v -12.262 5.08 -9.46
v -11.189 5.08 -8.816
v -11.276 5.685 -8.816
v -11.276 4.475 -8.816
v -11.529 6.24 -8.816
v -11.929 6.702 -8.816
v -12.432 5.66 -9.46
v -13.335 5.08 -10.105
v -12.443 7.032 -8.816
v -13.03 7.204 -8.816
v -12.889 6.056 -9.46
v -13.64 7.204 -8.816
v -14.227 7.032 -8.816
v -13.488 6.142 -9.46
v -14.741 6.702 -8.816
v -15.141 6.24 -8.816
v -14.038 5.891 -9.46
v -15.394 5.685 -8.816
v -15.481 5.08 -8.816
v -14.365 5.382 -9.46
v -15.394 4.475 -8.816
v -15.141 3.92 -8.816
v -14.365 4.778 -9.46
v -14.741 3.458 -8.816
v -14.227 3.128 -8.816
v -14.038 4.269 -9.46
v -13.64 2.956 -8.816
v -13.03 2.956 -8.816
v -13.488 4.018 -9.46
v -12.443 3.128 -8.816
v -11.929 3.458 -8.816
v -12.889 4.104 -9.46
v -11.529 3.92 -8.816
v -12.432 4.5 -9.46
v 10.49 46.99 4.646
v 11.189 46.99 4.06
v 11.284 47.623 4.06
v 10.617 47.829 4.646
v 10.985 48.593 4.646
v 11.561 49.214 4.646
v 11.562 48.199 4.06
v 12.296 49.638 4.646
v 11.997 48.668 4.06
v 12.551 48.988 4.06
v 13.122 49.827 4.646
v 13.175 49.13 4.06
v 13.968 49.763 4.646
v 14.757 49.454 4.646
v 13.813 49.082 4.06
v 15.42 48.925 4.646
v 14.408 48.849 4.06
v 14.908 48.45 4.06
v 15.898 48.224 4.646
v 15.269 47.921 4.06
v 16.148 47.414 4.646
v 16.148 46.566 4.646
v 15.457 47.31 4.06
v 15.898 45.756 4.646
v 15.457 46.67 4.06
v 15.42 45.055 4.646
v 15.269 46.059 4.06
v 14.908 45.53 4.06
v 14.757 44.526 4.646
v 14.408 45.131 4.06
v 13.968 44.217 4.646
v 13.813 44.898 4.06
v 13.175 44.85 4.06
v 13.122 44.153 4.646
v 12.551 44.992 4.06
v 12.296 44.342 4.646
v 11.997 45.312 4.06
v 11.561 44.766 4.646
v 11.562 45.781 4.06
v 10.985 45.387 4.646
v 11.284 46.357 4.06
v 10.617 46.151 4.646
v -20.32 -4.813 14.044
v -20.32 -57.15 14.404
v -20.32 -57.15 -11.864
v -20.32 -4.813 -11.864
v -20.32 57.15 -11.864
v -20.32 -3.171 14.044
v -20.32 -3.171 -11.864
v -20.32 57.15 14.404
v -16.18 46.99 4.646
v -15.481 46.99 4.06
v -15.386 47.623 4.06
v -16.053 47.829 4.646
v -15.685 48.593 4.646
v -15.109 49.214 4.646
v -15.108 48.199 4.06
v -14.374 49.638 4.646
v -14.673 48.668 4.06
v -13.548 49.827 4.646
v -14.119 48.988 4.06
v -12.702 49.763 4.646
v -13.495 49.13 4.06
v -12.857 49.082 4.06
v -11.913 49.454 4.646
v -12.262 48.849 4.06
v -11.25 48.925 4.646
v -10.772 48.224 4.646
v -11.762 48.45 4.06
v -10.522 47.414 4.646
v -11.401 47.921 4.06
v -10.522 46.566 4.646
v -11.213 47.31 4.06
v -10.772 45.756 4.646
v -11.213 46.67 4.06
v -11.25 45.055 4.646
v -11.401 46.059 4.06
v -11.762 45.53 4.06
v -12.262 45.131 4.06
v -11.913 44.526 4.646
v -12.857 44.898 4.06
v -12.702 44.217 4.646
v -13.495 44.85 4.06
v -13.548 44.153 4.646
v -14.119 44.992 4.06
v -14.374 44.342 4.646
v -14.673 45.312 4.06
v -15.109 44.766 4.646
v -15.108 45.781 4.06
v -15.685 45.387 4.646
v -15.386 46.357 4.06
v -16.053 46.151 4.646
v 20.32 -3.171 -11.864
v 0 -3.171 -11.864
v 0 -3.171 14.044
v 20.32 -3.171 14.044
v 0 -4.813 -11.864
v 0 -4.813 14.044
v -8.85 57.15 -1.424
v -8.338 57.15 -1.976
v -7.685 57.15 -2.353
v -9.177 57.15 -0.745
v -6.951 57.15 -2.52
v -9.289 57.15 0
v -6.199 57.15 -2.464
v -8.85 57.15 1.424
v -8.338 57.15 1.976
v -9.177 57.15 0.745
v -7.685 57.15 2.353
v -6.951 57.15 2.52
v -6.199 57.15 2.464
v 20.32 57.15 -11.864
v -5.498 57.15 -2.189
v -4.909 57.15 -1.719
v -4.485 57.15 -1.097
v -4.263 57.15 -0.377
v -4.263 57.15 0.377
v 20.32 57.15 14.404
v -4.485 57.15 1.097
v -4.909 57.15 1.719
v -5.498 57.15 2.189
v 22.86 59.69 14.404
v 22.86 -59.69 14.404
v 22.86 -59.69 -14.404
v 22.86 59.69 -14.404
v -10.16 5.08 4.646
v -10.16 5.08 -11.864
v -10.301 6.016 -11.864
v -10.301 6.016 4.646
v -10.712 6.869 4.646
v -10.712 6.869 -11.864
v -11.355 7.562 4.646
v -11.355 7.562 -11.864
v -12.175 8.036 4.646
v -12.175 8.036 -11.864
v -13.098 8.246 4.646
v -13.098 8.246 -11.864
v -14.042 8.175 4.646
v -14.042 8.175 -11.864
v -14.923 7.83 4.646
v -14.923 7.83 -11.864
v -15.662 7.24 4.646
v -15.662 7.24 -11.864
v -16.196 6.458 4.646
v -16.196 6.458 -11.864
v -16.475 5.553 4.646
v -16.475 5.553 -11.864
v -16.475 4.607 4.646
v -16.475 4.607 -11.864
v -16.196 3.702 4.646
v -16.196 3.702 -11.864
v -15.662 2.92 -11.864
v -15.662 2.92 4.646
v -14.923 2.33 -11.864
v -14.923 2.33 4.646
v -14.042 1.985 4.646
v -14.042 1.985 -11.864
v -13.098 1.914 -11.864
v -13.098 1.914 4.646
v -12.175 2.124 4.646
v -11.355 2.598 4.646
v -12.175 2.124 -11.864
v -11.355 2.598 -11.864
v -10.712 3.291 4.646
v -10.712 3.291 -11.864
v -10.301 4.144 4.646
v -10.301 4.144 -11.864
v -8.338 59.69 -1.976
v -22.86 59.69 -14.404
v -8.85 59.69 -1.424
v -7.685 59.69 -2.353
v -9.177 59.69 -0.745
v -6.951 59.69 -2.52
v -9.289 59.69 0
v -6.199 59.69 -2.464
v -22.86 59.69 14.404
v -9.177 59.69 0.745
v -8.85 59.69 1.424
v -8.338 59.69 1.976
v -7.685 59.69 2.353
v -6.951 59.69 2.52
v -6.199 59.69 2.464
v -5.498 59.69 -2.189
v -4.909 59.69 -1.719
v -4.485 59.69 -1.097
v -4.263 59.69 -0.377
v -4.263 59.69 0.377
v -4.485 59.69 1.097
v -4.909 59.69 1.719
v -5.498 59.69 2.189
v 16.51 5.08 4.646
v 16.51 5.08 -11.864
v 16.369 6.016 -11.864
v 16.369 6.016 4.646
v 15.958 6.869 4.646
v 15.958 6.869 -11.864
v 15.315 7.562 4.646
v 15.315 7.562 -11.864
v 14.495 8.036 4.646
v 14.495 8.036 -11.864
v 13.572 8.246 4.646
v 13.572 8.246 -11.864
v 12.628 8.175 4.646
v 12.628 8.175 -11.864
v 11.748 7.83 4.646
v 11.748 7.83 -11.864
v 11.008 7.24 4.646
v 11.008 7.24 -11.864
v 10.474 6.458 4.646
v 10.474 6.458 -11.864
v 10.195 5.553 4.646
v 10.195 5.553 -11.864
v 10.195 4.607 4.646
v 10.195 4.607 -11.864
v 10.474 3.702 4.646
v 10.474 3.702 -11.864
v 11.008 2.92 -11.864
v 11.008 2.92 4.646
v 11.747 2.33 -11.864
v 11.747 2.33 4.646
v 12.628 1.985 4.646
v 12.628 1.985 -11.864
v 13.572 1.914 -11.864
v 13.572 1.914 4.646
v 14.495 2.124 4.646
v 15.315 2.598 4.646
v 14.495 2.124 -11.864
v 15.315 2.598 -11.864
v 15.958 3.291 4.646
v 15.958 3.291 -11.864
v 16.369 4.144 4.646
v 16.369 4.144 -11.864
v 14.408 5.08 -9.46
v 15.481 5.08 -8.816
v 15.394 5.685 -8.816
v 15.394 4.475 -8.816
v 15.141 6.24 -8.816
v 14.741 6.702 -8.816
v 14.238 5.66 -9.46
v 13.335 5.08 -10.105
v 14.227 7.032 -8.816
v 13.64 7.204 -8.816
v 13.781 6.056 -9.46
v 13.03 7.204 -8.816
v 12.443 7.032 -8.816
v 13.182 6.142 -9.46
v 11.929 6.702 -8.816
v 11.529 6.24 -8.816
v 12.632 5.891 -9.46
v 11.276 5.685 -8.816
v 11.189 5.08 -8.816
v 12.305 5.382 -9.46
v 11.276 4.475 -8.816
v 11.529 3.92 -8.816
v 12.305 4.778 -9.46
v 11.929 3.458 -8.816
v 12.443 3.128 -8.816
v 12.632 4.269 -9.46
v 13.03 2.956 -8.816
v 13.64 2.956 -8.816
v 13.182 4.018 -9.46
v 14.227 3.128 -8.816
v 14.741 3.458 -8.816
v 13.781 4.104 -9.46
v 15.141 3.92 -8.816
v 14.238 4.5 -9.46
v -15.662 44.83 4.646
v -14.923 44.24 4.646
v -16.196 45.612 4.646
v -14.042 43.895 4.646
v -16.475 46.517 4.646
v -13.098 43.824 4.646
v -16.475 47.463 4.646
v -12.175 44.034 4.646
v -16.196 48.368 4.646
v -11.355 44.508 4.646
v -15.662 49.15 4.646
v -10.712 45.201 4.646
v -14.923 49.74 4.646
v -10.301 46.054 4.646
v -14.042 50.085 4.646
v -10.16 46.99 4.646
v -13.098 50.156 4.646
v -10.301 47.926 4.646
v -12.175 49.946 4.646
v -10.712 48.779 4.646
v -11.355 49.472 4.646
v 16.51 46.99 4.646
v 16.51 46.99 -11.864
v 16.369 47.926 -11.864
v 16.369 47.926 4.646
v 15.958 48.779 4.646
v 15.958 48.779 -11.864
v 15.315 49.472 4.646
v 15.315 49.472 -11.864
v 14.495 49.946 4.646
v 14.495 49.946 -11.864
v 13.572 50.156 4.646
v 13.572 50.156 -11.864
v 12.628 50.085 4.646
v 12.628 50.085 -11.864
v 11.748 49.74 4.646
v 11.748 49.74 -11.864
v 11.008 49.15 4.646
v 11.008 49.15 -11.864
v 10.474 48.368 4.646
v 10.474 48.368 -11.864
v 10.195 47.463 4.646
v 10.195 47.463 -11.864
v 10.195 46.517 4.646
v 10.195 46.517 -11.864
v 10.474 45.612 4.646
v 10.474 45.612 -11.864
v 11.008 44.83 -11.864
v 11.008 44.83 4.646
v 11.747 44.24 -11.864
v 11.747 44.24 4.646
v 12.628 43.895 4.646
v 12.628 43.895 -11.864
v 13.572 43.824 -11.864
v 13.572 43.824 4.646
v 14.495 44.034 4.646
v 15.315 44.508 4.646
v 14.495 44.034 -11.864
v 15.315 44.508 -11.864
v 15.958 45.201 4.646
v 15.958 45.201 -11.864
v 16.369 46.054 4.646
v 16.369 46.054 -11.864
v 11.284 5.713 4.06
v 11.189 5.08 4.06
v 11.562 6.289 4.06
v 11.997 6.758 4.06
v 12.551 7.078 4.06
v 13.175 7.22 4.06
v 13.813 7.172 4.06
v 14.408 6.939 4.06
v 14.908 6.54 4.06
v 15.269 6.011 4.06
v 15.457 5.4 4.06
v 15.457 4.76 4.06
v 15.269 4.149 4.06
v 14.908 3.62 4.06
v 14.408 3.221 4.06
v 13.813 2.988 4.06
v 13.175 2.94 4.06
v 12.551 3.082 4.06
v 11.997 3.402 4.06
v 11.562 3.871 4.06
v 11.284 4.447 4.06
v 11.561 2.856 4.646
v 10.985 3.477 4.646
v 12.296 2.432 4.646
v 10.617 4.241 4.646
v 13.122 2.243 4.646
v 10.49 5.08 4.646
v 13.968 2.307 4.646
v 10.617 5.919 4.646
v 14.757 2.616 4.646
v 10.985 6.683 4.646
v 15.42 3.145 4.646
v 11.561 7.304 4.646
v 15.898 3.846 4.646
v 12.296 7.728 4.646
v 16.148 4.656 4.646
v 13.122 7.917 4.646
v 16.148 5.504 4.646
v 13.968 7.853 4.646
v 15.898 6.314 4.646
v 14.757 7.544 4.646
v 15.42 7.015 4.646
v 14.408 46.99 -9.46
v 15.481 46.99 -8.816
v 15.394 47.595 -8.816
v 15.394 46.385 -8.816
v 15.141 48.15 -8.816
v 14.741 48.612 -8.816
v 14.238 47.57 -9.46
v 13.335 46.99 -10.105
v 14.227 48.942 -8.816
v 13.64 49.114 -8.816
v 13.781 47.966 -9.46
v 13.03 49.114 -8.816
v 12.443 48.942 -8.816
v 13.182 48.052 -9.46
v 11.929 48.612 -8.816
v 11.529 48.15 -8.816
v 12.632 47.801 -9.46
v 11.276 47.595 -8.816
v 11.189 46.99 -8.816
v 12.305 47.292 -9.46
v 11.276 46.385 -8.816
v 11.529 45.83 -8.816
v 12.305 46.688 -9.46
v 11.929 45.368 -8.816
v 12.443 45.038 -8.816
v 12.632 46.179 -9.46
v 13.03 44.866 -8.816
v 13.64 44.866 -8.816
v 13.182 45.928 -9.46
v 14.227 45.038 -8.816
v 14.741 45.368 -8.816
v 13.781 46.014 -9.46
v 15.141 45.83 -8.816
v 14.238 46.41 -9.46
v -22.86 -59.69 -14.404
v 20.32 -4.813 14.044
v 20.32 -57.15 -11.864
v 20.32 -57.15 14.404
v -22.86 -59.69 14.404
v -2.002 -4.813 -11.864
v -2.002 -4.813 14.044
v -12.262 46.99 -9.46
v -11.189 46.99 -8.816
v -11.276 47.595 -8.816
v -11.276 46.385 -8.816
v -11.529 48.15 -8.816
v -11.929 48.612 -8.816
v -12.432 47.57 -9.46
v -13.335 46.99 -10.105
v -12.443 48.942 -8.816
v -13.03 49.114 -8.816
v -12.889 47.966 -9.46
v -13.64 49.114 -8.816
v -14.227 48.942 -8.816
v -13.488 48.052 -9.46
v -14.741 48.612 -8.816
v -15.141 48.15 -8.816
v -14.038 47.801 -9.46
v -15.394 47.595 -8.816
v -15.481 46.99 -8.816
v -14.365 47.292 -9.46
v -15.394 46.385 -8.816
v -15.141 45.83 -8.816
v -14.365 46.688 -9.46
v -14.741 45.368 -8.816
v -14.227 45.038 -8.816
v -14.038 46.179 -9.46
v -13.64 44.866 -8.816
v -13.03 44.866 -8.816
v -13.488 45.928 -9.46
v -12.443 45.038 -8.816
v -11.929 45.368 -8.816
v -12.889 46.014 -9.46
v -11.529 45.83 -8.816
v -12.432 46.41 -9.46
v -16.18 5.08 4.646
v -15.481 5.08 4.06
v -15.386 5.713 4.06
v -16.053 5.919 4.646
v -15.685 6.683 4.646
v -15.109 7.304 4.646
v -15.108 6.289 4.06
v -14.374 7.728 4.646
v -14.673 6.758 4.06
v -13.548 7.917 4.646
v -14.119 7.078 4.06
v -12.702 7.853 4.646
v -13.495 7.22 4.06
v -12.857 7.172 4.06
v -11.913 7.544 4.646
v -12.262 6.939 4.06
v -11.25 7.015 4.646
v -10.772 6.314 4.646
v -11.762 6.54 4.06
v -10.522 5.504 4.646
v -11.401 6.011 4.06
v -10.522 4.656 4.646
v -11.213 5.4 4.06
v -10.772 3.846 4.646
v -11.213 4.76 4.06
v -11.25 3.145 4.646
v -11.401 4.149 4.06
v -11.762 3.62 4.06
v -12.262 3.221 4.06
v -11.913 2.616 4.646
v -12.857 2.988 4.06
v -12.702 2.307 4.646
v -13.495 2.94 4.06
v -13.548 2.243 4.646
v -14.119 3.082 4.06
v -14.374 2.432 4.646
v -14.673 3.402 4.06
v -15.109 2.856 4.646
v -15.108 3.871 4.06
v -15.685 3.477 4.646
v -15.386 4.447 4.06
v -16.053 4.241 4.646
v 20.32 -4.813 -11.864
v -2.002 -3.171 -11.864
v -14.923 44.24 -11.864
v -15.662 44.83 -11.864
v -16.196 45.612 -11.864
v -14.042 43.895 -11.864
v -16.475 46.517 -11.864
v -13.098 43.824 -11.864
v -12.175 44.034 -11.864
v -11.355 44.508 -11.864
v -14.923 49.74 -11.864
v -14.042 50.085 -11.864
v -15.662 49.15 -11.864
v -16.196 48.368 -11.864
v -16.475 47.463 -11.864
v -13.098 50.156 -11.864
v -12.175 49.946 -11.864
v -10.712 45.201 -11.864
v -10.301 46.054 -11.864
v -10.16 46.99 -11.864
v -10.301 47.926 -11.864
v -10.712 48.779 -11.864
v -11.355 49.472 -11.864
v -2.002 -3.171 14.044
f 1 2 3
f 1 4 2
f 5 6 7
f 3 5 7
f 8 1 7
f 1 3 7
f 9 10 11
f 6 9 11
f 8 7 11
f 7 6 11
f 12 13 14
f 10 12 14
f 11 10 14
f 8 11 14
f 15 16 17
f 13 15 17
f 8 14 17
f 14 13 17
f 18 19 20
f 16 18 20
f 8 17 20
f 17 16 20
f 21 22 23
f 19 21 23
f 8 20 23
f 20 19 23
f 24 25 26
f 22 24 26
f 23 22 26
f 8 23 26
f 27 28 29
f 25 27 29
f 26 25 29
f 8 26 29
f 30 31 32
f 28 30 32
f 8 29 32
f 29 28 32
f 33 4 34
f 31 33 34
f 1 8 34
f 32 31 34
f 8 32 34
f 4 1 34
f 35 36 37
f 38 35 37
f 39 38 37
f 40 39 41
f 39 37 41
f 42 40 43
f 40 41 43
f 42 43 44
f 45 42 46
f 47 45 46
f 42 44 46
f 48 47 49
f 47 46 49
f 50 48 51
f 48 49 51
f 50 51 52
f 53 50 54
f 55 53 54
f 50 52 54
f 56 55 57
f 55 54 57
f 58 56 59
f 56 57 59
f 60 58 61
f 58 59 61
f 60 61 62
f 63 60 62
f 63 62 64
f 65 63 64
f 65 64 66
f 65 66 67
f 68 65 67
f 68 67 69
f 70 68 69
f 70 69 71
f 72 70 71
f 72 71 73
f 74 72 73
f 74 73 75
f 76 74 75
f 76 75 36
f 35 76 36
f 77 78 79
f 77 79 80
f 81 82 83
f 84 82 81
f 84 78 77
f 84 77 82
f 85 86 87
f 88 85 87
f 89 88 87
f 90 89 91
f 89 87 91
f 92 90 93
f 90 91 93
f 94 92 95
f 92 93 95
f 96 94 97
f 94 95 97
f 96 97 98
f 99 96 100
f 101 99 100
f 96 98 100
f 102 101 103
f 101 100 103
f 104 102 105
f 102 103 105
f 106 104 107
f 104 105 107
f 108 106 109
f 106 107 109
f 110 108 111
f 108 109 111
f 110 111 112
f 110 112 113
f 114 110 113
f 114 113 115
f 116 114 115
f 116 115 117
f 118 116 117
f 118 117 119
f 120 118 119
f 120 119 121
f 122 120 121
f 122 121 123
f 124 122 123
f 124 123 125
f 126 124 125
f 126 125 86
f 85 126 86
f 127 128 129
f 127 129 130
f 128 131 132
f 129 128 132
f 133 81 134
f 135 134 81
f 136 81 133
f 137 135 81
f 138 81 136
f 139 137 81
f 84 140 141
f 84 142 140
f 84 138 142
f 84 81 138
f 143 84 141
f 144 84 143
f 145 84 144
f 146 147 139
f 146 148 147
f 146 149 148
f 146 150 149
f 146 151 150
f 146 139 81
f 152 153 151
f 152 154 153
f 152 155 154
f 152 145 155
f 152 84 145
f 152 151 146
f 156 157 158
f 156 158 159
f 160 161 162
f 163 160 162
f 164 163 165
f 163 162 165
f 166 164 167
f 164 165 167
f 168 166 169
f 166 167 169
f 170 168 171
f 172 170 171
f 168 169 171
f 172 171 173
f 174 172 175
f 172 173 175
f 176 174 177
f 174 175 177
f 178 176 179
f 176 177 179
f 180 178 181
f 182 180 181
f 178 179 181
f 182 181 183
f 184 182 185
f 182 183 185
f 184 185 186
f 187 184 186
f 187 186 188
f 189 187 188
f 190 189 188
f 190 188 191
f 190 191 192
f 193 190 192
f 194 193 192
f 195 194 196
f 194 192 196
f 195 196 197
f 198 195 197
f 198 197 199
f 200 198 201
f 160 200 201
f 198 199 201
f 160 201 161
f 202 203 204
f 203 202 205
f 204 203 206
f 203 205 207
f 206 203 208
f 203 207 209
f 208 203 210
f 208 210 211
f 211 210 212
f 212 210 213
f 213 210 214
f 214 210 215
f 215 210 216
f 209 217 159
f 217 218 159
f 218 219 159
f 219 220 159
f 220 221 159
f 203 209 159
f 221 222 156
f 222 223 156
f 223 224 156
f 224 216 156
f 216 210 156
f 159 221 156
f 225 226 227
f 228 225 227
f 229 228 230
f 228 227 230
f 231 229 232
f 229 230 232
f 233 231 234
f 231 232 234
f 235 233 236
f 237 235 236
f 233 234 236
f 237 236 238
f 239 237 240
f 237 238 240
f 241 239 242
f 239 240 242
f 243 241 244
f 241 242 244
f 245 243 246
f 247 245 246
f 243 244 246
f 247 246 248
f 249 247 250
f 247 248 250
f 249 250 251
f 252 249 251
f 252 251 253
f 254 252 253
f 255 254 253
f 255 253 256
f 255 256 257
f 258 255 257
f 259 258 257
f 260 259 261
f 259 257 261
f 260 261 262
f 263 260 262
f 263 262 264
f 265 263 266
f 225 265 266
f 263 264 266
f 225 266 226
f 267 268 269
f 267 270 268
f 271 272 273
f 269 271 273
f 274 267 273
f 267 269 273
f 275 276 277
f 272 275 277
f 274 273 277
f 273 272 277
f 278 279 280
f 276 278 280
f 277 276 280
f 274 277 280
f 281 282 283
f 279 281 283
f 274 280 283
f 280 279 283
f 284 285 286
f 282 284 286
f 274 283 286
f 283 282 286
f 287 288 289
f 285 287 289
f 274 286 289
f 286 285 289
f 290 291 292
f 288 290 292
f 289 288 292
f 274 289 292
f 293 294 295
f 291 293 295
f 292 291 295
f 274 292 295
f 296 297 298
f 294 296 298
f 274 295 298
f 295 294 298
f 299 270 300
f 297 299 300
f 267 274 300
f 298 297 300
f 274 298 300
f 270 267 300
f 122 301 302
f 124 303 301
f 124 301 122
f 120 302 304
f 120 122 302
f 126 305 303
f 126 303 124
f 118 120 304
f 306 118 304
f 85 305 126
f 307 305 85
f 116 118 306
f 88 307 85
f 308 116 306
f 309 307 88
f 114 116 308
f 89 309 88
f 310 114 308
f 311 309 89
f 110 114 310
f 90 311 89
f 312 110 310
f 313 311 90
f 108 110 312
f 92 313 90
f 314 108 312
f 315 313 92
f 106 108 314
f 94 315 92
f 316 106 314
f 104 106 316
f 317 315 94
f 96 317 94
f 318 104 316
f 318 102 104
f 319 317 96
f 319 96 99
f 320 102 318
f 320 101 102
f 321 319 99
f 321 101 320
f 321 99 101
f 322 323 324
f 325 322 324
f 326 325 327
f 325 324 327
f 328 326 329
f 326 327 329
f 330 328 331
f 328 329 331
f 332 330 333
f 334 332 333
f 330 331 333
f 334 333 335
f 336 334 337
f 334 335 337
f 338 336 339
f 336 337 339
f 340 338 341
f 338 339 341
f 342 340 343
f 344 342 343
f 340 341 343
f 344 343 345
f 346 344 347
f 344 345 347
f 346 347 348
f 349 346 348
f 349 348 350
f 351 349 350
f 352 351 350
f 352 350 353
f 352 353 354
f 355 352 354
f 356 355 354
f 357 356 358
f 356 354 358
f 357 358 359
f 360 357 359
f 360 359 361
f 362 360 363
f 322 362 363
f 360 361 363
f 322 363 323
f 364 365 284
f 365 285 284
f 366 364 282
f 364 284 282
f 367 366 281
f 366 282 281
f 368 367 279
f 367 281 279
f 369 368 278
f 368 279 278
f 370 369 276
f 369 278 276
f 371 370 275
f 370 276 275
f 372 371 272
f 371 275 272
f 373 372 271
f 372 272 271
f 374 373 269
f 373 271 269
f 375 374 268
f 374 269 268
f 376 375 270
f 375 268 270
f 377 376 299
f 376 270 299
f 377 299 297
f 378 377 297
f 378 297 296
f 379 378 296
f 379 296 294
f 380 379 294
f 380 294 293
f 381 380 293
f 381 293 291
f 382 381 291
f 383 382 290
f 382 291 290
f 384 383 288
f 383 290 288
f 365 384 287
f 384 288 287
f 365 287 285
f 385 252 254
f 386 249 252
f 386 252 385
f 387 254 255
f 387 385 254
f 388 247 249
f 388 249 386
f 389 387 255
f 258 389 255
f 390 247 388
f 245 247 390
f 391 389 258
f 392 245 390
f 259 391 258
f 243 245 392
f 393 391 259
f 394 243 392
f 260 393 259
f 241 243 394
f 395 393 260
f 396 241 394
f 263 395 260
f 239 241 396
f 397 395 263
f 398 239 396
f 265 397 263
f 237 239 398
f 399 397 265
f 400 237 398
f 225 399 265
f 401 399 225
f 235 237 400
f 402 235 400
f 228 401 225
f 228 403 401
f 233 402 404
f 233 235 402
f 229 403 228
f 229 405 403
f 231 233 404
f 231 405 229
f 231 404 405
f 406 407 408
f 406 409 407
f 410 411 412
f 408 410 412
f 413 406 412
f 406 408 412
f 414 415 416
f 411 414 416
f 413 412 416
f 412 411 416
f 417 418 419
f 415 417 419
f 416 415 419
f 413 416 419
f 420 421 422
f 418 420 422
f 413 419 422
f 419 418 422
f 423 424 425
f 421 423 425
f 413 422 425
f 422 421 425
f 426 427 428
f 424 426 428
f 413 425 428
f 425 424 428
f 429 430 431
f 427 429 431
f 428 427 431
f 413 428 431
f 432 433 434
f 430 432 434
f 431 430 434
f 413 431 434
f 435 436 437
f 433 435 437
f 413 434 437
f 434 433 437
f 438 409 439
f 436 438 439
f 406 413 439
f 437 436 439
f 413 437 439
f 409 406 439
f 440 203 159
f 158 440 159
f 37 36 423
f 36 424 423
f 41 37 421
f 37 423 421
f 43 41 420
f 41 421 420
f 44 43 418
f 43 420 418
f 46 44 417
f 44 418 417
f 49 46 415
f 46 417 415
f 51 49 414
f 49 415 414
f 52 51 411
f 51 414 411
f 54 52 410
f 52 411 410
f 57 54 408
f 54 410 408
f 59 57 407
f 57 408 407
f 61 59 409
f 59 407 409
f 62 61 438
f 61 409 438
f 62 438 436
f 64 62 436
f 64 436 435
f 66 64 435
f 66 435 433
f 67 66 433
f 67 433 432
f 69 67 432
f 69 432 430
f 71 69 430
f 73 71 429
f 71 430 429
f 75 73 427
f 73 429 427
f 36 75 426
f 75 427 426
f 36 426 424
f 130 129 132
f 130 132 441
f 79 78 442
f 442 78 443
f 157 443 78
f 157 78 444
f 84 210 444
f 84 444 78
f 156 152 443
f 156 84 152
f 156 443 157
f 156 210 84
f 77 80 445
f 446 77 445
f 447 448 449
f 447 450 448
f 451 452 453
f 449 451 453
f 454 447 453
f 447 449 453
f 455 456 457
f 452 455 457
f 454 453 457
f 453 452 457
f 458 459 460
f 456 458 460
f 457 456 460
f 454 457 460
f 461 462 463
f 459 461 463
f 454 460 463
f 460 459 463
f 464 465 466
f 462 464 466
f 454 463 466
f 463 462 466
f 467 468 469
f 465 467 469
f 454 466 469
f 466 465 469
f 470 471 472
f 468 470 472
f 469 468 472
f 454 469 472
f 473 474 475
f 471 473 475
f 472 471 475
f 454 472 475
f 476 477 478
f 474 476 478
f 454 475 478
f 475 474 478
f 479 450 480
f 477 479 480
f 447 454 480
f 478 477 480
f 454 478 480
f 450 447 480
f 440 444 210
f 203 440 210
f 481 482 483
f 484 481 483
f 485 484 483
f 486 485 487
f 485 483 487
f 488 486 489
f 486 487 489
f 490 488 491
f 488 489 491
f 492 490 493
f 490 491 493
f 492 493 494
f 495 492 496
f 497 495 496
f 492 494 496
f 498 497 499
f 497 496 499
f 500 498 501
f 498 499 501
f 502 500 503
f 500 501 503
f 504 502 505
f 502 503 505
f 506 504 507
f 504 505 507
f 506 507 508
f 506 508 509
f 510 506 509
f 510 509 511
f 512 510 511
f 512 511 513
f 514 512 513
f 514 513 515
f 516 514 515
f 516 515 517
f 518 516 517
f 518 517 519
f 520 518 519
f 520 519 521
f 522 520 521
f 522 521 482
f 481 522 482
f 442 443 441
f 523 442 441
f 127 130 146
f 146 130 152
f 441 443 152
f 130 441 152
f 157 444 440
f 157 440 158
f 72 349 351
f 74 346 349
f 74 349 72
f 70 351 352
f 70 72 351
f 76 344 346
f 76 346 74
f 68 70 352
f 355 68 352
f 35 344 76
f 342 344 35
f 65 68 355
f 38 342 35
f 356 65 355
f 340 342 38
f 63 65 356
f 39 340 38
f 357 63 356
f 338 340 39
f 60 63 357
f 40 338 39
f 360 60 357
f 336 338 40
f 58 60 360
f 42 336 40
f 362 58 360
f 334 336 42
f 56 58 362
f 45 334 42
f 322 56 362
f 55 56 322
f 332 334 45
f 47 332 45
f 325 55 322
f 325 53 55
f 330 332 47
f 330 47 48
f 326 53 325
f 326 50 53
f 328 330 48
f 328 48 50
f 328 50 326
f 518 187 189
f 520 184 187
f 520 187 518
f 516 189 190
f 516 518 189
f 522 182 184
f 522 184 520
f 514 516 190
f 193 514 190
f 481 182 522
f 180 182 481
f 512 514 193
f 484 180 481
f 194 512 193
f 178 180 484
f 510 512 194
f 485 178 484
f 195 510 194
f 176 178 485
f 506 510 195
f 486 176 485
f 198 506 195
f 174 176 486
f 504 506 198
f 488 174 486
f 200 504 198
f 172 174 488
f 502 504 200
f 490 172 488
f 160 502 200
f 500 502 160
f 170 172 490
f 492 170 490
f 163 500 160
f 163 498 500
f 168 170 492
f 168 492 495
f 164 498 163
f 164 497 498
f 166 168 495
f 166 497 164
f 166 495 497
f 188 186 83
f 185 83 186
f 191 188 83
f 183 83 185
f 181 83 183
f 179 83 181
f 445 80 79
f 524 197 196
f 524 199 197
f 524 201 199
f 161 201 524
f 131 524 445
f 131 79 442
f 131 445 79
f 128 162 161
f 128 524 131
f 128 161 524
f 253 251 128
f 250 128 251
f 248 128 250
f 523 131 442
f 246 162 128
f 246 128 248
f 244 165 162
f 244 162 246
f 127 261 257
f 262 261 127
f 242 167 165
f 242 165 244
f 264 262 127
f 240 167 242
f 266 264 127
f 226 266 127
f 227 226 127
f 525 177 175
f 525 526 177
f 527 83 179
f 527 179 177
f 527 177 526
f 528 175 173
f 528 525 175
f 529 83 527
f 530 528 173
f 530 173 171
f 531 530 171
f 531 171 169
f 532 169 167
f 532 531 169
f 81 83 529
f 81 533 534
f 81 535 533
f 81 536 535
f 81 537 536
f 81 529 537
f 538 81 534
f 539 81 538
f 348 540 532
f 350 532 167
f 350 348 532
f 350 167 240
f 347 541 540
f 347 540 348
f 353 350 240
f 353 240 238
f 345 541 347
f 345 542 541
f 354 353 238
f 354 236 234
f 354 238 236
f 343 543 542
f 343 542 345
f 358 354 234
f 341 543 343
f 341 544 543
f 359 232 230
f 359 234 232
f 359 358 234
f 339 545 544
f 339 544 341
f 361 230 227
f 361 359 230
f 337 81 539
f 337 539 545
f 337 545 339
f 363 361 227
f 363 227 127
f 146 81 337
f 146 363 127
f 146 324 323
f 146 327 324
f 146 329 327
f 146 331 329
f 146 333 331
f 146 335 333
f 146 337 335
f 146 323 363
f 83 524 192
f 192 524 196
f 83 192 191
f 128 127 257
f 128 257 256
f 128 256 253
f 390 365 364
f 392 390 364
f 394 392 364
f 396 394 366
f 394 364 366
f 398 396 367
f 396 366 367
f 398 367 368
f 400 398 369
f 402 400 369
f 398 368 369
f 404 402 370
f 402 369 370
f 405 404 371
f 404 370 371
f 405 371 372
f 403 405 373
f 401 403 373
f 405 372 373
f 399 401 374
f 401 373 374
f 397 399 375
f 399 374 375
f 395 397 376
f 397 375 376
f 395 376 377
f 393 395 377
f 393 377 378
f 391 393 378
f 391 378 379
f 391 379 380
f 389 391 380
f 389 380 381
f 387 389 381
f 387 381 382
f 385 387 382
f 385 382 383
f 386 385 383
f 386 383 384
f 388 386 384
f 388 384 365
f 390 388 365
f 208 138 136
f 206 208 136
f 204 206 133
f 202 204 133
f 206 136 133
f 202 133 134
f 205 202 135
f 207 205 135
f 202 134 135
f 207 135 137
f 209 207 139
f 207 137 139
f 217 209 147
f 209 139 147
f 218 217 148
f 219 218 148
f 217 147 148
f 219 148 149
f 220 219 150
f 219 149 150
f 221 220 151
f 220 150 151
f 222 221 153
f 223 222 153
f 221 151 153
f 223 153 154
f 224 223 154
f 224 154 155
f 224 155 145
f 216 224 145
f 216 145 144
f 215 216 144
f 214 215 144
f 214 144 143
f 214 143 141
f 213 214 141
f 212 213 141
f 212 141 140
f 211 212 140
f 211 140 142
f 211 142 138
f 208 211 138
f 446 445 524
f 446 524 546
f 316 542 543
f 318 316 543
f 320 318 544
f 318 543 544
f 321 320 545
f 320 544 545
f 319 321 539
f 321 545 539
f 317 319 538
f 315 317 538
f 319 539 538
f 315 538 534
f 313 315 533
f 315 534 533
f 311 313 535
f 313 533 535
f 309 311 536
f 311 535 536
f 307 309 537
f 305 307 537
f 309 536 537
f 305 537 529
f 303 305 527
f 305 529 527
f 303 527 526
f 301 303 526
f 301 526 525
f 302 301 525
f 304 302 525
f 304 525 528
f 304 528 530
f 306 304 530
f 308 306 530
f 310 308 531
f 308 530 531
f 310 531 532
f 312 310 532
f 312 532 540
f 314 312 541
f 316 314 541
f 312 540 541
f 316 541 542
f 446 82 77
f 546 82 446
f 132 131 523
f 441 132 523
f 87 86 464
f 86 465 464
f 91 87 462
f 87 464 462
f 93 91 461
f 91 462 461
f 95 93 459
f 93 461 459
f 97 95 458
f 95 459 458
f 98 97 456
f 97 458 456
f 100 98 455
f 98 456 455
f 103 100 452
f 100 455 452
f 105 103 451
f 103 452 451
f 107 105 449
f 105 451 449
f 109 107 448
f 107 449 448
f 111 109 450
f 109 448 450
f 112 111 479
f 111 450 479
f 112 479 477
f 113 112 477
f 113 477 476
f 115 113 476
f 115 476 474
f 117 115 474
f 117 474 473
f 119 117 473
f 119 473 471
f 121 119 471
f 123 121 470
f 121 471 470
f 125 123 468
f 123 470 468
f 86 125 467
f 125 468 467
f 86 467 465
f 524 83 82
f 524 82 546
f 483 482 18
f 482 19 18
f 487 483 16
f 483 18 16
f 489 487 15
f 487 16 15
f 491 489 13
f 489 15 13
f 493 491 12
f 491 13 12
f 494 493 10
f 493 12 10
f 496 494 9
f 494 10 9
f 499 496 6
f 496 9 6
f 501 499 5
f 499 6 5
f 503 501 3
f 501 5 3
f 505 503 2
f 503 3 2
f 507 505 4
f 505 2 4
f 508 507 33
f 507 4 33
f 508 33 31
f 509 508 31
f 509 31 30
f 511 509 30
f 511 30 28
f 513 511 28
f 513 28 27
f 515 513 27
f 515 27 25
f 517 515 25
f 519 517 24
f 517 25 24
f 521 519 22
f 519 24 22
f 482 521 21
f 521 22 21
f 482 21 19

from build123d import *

# Parameters (mm, degrees)
SKETCH1_W                            = 45.72
SKETCH1_H                            = 119.38
BOSS_EXTRUDE1_DEPTH                  = 14.403566373
SHELL3_T                             = -2.54
SKETCH4_R                            = 3.175
BOSS_EXTRUDE2_DEPTH                  = 16.51
F_8_0_199_DIAMETER_HOLE1_D           = 5.0546
F_8_0_199_DIAMETER_HOLE1_DEPTH       = 2.54
SKETCH19_W                           = 40.64
SKETCH19_H                           = 1.642675469
BOSS_EXTRUDE3_DEPTH                  = 25.908
SKETCH23_W                           = 2.002221862
SKETCH23_H                           = 25.908
CUT_EXTRUDE2_DEPTH                   = 15.748
F_4_0_209_DIAMETER_HOLE1_D           = 4.2926
F_4_0_209_DIAMETER_HOLE1_DEPTH       = 13.462
F_4_0_209_DIAMETER_HOLE1_CSINK_D     = 5.6896
F_4_0_209_DIAMETER_HOLE1_CSINK_ANGLE = 100
F_4_0_209_DIAMETER_HOLE1_TIP         = 1.289627147


with BuildPart() as part:
    # Sketch1 → Boss-Extrude1 (new body, symmetric)
    with BuildSketch(Plane.XY):
        Rectangle(SKETCH1_W, SKETCH1_H)
    extrude(amount=BOSS_EXTRUDE1_DEPTH, both=True)

    # Shell3
    shell3_openings = [part.faces().sort_by_distance(p)[0] for p in [
        (0, 0, 14.403566373),
    ]]
    offset(amount=SHELL3_T, openings=shell3_openings, kind=Kind.INTERSECTION)

    # Sketch4 → Boss-Extrude2 (add)
    with BuildSketch(Plane.XY.offset(-11.863566373)):
        with Locations((-13.335, 46.99)):
            Circle(SKETCH4_R)
        with Locations((13.335, 46.99)):
            Circle(SKETCH4_R)
        with Locations((13.335, 5.08)):
            Circle(SKETCH4_R)
        with Locations((-13.335, 5.08)):
            Circle(SKETCH4_R)
    extrude(amount=BOSS_EXTRUDE2_DEPTH)

    # #8 (0.199) Diameter Hole1
    with Locations(Plane(origin=(0, 59.69, 0), x_dir=(1, 0, 0), z_dir=(0, 1, 0))):
        with Locations((-6.761861897, 0), (-42.285600541, -5.559615493)):
            Hole(F_8_0_199_DIAMETER_HOLE1_D / 2, depth=F_8_0_199_DIAMETER_HOLE1_DEPTH)

    # Sketch19 → Boss-Extrude3 (add)
    with BuildSketch(Plane.XY.offset(-11.863566373)):
        with Locations((0, -3.991920643)):
            Rectangle(SKETCH19_W, SKETCH19_H)
    extrude(amount=BOSS_EXTRUDE3_DEPTH)

    # Sketch23 → Cut-Extrude2 (cut)
    with BuildSketch(Plane.XZ.offset(4.813258377)):
        with Locations((-1.001110931, 1.090433627)):
            Rectangle(SKETCH23_W, SKETCH23_H)
    extrude(amount=-CUT_EXTRUDE2_DEPTH, mode=Mode.SUBTRACT)

    # #4 (0.209) Diameter Hole1
    with Locations(Plane.XY.offset(4.646433627)):
        with Locations((-13.335, 5.08), (-13.335, 46.99), (13.335, 5.08), (13.335, 46.99)):
            CounterSinkHole(F_4_0_209_DIAMETER_HOLE1_D / 2, F_4_0_209_DIAMETER_HOLE1_CSINK_D / 2, depth=F_4_0_209_DIAMETER_HOLE1_DEPTH, counter_sink_angle=F_4_0_209_DIAMETER_HOLE1_CSINK_ANGLE)
            with Locations((0, 0, -(F_4_0_209_DIAMETER_HOLE1_DEPTH + F_4_0_209_DIAMETER_HOLE1_TIP / 2))):  # 118° drill point
                Cone(0, F_4_0_209_DIAMETER_HOLE1_D / 2, F_4_0_209_DIAMETER_HOLE1_TIP, mode=Mode.SUBTRACT)


solid = part.part
